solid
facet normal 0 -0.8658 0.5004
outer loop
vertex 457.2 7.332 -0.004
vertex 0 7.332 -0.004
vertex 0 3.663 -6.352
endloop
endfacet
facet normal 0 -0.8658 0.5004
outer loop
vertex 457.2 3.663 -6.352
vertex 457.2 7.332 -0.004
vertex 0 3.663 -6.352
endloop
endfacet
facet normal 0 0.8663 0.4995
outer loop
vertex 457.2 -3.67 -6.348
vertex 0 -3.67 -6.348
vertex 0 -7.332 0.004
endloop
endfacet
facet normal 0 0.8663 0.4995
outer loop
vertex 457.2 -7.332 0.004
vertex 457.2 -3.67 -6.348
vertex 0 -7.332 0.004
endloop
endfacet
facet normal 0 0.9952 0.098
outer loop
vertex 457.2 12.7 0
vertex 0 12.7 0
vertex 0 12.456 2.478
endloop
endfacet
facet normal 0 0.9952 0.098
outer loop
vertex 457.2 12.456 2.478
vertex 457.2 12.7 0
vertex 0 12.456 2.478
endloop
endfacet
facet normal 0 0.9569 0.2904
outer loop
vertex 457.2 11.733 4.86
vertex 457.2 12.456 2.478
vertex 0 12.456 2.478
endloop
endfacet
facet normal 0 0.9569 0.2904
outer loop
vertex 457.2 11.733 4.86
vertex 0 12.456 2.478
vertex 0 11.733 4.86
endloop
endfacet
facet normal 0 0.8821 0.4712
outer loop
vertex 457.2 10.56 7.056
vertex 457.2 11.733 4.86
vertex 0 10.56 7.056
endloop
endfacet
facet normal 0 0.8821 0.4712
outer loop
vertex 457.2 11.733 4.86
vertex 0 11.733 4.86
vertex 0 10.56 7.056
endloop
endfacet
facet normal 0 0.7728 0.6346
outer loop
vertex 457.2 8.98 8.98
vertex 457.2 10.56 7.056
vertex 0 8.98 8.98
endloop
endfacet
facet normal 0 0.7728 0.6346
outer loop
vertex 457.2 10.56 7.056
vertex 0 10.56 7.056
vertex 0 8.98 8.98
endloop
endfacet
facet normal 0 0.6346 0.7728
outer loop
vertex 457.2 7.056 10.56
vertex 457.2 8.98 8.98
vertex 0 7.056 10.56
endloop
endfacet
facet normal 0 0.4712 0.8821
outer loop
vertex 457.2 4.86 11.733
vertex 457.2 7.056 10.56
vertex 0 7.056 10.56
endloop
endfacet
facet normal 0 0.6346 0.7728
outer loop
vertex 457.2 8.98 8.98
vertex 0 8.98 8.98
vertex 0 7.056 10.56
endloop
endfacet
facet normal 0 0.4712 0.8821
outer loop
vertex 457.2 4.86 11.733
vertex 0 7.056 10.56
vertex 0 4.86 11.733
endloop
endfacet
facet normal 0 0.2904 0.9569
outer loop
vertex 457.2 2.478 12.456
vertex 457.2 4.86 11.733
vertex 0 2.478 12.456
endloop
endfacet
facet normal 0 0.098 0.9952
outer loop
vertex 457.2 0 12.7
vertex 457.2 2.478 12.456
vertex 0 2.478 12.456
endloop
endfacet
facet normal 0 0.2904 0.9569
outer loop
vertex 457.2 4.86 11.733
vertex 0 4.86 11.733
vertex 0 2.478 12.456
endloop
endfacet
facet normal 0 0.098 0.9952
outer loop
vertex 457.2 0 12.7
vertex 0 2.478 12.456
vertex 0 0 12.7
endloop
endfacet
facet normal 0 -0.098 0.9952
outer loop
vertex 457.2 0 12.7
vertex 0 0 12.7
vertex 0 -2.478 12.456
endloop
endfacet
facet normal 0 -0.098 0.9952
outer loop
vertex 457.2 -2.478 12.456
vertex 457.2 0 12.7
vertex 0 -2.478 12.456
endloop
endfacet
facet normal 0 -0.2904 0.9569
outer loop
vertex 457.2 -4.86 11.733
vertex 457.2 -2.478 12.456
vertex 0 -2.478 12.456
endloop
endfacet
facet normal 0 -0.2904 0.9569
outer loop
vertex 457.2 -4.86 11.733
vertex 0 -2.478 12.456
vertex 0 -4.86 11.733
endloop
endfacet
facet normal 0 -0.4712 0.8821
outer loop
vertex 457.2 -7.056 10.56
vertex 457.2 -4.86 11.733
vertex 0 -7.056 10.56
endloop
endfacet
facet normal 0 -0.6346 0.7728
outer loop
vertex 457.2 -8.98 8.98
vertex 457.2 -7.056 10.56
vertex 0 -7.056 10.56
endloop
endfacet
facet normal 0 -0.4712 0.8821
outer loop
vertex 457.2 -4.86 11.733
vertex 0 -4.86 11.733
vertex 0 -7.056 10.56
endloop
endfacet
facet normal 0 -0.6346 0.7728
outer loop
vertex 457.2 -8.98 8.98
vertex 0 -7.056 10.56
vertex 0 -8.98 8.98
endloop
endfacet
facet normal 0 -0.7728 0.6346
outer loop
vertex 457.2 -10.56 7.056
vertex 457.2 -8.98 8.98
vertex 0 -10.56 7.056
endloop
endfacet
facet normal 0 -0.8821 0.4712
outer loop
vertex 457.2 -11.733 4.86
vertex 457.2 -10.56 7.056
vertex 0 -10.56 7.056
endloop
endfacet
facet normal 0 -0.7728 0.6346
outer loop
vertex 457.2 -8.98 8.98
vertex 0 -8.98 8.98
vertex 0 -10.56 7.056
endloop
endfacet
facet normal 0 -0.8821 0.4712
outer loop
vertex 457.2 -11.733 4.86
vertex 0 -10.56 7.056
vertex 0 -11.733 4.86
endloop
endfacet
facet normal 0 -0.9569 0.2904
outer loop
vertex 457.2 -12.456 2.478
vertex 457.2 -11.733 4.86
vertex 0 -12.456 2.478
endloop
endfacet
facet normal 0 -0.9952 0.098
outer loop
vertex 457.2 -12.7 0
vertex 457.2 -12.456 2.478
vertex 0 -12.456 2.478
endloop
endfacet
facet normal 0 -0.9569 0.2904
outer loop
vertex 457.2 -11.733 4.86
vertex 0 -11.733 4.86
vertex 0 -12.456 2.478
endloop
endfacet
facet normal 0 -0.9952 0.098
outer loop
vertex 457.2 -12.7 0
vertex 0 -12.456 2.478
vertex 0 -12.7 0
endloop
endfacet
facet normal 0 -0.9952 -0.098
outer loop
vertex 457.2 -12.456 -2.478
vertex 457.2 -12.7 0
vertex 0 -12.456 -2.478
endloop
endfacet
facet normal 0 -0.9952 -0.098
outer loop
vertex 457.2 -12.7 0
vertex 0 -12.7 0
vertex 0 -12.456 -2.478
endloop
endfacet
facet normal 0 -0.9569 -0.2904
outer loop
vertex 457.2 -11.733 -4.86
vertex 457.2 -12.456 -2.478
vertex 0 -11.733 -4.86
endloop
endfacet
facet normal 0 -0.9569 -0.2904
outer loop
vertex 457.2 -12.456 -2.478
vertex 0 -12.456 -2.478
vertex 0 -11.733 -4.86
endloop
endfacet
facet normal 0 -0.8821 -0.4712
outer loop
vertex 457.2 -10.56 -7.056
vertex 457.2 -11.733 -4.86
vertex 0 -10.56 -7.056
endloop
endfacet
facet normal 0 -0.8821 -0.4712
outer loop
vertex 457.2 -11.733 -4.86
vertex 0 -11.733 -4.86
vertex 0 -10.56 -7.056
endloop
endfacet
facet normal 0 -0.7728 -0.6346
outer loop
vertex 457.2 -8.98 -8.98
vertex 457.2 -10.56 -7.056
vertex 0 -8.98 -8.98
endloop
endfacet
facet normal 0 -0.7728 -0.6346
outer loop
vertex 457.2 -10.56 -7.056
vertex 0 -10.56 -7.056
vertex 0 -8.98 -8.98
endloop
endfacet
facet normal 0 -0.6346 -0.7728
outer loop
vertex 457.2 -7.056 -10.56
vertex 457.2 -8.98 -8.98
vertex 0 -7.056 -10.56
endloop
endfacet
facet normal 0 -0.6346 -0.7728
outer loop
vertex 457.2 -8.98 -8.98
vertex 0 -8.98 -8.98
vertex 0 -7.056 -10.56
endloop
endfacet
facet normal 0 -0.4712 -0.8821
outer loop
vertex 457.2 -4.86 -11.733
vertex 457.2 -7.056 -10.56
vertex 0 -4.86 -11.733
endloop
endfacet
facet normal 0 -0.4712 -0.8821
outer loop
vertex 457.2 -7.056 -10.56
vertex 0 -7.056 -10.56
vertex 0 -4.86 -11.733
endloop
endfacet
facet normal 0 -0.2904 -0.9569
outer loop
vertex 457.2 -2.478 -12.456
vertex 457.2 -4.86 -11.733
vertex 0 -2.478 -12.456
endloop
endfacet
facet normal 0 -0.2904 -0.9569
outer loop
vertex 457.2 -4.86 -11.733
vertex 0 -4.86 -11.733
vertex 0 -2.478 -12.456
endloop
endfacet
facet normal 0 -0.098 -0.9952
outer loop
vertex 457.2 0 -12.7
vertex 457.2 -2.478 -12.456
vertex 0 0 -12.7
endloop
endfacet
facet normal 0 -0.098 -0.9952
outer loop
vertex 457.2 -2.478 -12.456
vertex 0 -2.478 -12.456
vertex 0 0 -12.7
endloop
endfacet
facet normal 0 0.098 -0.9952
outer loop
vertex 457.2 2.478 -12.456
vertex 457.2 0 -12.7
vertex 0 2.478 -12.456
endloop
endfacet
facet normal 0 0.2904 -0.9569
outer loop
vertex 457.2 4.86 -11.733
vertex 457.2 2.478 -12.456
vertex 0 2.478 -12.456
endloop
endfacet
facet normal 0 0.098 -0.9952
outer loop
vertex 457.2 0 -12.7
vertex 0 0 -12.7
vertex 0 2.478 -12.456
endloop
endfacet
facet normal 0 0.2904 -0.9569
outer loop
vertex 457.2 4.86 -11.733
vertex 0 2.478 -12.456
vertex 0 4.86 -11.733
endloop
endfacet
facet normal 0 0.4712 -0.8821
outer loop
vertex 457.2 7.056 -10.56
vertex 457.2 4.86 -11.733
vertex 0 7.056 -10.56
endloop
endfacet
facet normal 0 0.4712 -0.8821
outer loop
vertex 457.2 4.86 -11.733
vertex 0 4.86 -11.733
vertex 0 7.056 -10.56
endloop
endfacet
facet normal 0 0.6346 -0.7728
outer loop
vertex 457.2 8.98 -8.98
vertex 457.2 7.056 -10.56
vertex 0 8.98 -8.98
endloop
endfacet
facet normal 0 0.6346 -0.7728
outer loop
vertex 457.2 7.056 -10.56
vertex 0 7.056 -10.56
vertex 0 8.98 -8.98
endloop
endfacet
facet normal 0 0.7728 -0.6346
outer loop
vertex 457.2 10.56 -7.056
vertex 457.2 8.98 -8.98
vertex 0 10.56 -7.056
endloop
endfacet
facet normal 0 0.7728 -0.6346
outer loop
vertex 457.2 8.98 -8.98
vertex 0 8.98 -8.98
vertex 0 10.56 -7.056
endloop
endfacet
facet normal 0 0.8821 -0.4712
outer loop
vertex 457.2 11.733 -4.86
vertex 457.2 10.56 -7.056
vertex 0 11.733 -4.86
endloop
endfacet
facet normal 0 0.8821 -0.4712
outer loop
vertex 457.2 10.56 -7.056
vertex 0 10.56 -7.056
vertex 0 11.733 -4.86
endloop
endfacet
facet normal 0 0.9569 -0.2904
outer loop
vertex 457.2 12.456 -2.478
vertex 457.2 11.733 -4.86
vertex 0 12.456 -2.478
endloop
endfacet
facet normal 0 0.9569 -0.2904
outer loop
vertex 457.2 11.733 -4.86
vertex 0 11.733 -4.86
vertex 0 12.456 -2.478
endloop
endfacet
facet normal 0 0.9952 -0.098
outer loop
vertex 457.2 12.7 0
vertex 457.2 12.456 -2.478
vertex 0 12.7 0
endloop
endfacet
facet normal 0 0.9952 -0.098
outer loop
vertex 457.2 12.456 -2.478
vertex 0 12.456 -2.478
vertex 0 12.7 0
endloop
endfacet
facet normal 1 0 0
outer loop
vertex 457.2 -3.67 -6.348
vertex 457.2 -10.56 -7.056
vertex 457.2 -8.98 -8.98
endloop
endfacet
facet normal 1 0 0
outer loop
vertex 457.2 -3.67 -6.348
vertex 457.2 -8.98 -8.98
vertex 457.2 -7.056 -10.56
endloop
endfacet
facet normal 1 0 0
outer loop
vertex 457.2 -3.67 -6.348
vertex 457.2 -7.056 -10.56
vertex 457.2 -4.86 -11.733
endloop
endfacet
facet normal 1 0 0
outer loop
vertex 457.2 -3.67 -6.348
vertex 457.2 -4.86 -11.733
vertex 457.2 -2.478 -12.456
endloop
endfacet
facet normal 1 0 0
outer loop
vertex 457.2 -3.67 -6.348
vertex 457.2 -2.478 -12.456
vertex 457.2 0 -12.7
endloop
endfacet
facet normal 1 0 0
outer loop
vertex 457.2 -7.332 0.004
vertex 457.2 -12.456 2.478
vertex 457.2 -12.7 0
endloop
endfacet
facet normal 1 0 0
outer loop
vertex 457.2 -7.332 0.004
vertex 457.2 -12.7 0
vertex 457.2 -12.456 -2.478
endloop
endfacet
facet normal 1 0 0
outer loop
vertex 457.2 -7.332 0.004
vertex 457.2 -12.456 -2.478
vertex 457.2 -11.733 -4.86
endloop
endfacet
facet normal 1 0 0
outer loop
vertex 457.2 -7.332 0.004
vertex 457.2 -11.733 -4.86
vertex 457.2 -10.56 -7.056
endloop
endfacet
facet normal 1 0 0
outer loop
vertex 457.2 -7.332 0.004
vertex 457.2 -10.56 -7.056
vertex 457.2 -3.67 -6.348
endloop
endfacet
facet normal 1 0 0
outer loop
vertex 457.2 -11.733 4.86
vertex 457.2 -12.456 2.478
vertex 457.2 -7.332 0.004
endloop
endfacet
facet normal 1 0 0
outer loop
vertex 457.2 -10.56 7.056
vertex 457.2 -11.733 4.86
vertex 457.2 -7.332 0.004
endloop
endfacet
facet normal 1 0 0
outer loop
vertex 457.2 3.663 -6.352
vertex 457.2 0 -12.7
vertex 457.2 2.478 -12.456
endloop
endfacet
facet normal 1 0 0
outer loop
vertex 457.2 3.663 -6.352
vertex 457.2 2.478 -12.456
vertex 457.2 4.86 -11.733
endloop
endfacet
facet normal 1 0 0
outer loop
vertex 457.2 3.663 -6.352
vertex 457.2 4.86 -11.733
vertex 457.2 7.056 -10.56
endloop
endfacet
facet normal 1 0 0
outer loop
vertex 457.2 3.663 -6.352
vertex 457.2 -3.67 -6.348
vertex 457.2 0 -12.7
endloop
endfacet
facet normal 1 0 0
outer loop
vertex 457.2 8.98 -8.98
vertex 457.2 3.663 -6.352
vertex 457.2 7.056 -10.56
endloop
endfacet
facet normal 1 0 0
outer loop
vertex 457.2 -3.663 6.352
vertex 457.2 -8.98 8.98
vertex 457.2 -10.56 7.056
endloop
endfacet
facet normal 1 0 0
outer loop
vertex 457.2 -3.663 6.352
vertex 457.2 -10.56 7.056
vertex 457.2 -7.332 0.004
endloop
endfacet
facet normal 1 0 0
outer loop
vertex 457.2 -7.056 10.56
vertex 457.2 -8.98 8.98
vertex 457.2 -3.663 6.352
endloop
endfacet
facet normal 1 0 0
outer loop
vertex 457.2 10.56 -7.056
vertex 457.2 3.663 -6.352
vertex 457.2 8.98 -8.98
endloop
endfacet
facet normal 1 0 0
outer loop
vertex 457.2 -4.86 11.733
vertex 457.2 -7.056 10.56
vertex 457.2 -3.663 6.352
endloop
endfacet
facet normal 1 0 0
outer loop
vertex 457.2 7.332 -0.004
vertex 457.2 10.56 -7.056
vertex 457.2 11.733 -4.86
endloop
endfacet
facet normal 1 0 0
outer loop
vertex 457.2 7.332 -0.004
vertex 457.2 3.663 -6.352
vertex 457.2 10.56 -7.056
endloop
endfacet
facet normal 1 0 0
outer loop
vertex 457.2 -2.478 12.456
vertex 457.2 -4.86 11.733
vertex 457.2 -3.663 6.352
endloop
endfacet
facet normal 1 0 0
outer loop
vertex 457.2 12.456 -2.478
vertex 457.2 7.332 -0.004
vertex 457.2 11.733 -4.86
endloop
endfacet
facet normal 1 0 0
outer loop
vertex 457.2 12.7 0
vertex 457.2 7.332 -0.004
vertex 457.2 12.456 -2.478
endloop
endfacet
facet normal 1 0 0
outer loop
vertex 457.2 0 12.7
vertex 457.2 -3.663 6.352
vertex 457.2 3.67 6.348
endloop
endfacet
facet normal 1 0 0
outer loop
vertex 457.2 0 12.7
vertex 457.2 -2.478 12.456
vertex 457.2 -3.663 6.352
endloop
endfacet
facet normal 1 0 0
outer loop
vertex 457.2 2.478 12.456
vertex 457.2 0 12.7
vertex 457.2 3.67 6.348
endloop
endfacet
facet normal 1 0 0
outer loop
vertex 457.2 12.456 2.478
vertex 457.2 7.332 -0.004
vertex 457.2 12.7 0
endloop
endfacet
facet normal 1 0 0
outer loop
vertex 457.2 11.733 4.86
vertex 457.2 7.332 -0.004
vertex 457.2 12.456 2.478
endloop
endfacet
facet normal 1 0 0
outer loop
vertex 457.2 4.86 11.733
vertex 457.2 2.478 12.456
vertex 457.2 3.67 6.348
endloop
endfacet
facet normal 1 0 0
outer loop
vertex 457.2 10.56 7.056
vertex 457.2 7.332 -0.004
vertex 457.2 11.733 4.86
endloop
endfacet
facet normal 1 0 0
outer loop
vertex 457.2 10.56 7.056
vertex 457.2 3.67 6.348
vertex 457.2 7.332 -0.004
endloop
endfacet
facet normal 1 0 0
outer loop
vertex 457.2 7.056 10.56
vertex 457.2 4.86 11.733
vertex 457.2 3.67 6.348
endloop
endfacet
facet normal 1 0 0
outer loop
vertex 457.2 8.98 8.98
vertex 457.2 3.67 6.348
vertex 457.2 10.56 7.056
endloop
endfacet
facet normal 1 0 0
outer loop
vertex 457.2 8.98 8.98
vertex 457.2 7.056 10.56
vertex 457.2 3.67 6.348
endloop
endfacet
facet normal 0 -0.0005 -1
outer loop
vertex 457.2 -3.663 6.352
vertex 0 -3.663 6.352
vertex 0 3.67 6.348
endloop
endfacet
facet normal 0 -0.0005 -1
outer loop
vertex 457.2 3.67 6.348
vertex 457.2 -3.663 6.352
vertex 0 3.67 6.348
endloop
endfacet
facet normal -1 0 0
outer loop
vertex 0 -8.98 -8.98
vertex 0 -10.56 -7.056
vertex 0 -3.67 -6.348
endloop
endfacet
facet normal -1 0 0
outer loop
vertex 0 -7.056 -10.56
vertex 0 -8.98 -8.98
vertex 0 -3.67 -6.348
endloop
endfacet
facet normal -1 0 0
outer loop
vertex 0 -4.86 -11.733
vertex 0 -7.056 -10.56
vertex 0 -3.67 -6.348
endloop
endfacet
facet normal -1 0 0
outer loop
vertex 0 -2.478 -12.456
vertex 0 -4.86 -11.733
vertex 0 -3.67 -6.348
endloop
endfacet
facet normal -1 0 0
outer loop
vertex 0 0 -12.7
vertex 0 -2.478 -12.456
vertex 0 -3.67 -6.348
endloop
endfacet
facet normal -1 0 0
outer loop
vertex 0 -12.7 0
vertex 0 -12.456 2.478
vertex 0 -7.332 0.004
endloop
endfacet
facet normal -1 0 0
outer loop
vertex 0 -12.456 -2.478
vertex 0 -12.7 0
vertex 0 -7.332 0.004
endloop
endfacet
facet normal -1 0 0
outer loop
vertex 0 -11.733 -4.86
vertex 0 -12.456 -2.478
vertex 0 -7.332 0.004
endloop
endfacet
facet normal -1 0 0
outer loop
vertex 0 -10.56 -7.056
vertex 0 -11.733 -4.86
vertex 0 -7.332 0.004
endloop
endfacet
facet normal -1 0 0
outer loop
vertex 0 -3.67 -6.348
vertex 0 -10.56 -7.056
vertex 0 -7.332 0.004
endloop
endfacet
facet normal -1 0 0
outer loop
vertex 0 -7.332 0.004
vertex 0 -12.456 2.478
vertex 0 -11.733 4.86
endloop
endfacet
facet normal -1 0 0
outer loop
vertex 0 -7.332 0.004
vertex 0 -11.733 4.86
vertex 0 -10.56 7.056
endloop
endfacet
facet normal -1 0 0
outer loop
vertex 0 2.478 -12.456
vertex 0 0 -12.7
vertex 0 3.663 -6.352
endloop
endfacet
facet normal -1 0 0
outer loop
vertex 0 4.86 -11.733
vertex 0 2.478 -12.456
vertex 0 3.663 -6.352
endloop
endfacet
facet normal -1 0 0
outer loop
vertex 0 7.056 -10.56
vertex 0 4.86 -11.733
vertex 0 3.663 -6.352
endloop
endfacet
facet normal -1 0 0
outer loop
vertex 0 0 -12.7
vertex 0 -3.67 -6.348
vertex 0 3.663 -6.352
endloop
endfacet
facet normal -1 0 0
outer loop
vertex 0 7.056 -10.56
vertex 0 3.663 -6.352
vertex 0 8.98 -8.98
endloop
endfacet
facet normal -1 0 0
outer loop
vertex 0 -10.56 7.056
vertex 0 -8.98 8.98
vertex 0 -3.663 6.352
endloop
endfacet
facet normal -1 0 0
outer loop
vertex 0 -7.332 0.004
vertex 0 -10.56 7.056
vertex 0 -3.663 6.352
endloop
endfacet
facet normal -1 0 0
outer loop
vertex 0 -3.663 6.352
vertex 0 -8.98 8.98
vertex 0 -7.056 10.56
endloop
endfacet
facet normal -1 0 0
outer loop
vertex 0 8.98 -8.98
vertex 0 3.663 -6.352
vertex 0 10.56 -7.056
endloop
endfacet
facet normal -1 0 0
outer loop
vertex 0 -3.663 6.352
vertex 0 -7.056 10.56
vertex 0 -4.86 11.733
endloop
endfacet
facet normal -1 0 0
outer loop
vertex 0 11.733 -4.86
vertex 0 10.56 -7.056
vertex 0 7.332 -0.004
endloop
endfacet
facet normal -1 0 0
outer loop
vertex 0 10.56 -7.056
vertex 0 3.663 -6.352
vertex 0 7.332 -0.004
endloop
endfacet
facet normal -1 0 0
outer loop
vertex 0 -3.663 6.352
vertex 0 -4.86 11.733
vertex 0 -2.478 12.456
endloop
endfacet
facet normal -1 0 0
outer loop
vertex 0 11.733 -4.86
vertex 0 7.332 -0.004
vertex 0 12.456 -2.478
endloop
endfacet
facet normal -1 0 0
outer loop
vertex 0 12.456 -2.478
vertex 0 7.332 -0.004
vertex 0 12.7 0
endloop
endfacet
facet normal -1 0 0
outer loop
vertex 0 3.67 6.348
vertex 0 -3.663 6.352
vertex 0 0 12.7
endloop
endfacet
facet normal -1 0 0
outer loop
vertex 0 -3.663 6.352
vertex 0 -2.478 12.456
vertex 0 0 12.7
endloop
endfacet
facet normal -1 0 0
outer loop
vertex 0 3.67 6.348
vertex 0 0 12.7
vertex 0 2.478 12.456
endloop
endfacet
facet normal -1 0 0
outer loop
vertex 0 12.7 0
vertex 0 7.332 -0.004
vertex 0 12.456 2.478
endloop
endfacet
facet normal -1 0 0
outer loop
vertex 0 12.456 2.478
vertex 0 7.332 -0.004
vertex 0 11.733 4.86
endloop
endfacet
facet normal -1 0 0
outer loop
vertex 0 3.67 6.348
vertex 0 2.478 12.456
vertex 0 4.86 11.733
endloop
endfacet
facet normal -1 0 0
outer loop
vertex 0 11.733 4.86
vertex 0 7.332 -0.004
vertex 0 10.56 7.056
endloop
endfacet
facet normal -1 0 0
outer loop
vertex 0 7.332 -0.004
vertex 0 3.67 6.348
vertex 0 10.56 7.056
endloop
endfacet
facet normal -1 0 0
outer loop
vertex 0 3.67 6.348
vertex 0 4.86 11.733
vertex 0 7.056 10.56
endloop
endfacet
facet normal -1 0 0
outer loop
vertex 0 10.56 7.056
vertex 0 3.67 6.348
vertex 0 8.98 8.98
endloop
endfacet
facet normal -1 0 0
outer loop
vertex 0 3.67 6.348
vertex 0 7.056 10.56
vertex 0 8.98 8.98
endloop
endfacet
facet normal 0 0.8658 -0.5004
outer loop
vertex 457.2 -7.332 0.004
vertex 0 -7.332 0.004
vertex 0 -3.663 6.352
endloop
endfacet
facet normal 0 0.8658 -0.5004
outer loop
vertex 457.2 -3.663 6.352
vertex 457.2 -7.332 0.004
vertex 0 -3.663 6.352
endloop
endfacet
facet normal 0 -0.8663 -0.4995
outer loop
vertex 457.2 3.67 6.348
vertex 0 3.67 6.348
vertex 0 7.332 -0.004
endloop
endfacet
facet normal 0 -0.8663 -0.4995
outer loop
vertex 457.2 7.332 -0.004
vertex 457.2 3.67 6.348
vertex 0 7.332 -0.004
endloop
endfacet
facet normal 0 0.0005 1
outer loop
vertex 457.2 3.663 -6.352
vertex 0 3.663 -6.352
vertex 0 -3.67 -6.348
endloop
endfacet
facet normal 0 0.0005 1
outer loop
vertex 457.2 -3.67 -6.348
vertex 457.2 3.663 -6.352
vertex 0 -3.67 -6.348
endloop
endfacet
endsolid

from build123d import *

# Parameters (mm, degrees)
F0_R     = 12.7
F1_DEPTH = 457.2


with BuildPart() as f1:
    # F0 (on Right) → F1 (new body)
    with BuildSketch(Plane.YZ):
        Circle(F0_R)
        Polygon((-3.662843, 6.351922), (3.669504, 6.348076), (7.332347, -0.003845), (3.662843, -6.351922), (-3.669504, -6.348076), (-7.332347, 0.003845), align=None, mode=Mode.SUBTRACT)
    extrude(amount=F1_DEPTH)


solid = f1.part
